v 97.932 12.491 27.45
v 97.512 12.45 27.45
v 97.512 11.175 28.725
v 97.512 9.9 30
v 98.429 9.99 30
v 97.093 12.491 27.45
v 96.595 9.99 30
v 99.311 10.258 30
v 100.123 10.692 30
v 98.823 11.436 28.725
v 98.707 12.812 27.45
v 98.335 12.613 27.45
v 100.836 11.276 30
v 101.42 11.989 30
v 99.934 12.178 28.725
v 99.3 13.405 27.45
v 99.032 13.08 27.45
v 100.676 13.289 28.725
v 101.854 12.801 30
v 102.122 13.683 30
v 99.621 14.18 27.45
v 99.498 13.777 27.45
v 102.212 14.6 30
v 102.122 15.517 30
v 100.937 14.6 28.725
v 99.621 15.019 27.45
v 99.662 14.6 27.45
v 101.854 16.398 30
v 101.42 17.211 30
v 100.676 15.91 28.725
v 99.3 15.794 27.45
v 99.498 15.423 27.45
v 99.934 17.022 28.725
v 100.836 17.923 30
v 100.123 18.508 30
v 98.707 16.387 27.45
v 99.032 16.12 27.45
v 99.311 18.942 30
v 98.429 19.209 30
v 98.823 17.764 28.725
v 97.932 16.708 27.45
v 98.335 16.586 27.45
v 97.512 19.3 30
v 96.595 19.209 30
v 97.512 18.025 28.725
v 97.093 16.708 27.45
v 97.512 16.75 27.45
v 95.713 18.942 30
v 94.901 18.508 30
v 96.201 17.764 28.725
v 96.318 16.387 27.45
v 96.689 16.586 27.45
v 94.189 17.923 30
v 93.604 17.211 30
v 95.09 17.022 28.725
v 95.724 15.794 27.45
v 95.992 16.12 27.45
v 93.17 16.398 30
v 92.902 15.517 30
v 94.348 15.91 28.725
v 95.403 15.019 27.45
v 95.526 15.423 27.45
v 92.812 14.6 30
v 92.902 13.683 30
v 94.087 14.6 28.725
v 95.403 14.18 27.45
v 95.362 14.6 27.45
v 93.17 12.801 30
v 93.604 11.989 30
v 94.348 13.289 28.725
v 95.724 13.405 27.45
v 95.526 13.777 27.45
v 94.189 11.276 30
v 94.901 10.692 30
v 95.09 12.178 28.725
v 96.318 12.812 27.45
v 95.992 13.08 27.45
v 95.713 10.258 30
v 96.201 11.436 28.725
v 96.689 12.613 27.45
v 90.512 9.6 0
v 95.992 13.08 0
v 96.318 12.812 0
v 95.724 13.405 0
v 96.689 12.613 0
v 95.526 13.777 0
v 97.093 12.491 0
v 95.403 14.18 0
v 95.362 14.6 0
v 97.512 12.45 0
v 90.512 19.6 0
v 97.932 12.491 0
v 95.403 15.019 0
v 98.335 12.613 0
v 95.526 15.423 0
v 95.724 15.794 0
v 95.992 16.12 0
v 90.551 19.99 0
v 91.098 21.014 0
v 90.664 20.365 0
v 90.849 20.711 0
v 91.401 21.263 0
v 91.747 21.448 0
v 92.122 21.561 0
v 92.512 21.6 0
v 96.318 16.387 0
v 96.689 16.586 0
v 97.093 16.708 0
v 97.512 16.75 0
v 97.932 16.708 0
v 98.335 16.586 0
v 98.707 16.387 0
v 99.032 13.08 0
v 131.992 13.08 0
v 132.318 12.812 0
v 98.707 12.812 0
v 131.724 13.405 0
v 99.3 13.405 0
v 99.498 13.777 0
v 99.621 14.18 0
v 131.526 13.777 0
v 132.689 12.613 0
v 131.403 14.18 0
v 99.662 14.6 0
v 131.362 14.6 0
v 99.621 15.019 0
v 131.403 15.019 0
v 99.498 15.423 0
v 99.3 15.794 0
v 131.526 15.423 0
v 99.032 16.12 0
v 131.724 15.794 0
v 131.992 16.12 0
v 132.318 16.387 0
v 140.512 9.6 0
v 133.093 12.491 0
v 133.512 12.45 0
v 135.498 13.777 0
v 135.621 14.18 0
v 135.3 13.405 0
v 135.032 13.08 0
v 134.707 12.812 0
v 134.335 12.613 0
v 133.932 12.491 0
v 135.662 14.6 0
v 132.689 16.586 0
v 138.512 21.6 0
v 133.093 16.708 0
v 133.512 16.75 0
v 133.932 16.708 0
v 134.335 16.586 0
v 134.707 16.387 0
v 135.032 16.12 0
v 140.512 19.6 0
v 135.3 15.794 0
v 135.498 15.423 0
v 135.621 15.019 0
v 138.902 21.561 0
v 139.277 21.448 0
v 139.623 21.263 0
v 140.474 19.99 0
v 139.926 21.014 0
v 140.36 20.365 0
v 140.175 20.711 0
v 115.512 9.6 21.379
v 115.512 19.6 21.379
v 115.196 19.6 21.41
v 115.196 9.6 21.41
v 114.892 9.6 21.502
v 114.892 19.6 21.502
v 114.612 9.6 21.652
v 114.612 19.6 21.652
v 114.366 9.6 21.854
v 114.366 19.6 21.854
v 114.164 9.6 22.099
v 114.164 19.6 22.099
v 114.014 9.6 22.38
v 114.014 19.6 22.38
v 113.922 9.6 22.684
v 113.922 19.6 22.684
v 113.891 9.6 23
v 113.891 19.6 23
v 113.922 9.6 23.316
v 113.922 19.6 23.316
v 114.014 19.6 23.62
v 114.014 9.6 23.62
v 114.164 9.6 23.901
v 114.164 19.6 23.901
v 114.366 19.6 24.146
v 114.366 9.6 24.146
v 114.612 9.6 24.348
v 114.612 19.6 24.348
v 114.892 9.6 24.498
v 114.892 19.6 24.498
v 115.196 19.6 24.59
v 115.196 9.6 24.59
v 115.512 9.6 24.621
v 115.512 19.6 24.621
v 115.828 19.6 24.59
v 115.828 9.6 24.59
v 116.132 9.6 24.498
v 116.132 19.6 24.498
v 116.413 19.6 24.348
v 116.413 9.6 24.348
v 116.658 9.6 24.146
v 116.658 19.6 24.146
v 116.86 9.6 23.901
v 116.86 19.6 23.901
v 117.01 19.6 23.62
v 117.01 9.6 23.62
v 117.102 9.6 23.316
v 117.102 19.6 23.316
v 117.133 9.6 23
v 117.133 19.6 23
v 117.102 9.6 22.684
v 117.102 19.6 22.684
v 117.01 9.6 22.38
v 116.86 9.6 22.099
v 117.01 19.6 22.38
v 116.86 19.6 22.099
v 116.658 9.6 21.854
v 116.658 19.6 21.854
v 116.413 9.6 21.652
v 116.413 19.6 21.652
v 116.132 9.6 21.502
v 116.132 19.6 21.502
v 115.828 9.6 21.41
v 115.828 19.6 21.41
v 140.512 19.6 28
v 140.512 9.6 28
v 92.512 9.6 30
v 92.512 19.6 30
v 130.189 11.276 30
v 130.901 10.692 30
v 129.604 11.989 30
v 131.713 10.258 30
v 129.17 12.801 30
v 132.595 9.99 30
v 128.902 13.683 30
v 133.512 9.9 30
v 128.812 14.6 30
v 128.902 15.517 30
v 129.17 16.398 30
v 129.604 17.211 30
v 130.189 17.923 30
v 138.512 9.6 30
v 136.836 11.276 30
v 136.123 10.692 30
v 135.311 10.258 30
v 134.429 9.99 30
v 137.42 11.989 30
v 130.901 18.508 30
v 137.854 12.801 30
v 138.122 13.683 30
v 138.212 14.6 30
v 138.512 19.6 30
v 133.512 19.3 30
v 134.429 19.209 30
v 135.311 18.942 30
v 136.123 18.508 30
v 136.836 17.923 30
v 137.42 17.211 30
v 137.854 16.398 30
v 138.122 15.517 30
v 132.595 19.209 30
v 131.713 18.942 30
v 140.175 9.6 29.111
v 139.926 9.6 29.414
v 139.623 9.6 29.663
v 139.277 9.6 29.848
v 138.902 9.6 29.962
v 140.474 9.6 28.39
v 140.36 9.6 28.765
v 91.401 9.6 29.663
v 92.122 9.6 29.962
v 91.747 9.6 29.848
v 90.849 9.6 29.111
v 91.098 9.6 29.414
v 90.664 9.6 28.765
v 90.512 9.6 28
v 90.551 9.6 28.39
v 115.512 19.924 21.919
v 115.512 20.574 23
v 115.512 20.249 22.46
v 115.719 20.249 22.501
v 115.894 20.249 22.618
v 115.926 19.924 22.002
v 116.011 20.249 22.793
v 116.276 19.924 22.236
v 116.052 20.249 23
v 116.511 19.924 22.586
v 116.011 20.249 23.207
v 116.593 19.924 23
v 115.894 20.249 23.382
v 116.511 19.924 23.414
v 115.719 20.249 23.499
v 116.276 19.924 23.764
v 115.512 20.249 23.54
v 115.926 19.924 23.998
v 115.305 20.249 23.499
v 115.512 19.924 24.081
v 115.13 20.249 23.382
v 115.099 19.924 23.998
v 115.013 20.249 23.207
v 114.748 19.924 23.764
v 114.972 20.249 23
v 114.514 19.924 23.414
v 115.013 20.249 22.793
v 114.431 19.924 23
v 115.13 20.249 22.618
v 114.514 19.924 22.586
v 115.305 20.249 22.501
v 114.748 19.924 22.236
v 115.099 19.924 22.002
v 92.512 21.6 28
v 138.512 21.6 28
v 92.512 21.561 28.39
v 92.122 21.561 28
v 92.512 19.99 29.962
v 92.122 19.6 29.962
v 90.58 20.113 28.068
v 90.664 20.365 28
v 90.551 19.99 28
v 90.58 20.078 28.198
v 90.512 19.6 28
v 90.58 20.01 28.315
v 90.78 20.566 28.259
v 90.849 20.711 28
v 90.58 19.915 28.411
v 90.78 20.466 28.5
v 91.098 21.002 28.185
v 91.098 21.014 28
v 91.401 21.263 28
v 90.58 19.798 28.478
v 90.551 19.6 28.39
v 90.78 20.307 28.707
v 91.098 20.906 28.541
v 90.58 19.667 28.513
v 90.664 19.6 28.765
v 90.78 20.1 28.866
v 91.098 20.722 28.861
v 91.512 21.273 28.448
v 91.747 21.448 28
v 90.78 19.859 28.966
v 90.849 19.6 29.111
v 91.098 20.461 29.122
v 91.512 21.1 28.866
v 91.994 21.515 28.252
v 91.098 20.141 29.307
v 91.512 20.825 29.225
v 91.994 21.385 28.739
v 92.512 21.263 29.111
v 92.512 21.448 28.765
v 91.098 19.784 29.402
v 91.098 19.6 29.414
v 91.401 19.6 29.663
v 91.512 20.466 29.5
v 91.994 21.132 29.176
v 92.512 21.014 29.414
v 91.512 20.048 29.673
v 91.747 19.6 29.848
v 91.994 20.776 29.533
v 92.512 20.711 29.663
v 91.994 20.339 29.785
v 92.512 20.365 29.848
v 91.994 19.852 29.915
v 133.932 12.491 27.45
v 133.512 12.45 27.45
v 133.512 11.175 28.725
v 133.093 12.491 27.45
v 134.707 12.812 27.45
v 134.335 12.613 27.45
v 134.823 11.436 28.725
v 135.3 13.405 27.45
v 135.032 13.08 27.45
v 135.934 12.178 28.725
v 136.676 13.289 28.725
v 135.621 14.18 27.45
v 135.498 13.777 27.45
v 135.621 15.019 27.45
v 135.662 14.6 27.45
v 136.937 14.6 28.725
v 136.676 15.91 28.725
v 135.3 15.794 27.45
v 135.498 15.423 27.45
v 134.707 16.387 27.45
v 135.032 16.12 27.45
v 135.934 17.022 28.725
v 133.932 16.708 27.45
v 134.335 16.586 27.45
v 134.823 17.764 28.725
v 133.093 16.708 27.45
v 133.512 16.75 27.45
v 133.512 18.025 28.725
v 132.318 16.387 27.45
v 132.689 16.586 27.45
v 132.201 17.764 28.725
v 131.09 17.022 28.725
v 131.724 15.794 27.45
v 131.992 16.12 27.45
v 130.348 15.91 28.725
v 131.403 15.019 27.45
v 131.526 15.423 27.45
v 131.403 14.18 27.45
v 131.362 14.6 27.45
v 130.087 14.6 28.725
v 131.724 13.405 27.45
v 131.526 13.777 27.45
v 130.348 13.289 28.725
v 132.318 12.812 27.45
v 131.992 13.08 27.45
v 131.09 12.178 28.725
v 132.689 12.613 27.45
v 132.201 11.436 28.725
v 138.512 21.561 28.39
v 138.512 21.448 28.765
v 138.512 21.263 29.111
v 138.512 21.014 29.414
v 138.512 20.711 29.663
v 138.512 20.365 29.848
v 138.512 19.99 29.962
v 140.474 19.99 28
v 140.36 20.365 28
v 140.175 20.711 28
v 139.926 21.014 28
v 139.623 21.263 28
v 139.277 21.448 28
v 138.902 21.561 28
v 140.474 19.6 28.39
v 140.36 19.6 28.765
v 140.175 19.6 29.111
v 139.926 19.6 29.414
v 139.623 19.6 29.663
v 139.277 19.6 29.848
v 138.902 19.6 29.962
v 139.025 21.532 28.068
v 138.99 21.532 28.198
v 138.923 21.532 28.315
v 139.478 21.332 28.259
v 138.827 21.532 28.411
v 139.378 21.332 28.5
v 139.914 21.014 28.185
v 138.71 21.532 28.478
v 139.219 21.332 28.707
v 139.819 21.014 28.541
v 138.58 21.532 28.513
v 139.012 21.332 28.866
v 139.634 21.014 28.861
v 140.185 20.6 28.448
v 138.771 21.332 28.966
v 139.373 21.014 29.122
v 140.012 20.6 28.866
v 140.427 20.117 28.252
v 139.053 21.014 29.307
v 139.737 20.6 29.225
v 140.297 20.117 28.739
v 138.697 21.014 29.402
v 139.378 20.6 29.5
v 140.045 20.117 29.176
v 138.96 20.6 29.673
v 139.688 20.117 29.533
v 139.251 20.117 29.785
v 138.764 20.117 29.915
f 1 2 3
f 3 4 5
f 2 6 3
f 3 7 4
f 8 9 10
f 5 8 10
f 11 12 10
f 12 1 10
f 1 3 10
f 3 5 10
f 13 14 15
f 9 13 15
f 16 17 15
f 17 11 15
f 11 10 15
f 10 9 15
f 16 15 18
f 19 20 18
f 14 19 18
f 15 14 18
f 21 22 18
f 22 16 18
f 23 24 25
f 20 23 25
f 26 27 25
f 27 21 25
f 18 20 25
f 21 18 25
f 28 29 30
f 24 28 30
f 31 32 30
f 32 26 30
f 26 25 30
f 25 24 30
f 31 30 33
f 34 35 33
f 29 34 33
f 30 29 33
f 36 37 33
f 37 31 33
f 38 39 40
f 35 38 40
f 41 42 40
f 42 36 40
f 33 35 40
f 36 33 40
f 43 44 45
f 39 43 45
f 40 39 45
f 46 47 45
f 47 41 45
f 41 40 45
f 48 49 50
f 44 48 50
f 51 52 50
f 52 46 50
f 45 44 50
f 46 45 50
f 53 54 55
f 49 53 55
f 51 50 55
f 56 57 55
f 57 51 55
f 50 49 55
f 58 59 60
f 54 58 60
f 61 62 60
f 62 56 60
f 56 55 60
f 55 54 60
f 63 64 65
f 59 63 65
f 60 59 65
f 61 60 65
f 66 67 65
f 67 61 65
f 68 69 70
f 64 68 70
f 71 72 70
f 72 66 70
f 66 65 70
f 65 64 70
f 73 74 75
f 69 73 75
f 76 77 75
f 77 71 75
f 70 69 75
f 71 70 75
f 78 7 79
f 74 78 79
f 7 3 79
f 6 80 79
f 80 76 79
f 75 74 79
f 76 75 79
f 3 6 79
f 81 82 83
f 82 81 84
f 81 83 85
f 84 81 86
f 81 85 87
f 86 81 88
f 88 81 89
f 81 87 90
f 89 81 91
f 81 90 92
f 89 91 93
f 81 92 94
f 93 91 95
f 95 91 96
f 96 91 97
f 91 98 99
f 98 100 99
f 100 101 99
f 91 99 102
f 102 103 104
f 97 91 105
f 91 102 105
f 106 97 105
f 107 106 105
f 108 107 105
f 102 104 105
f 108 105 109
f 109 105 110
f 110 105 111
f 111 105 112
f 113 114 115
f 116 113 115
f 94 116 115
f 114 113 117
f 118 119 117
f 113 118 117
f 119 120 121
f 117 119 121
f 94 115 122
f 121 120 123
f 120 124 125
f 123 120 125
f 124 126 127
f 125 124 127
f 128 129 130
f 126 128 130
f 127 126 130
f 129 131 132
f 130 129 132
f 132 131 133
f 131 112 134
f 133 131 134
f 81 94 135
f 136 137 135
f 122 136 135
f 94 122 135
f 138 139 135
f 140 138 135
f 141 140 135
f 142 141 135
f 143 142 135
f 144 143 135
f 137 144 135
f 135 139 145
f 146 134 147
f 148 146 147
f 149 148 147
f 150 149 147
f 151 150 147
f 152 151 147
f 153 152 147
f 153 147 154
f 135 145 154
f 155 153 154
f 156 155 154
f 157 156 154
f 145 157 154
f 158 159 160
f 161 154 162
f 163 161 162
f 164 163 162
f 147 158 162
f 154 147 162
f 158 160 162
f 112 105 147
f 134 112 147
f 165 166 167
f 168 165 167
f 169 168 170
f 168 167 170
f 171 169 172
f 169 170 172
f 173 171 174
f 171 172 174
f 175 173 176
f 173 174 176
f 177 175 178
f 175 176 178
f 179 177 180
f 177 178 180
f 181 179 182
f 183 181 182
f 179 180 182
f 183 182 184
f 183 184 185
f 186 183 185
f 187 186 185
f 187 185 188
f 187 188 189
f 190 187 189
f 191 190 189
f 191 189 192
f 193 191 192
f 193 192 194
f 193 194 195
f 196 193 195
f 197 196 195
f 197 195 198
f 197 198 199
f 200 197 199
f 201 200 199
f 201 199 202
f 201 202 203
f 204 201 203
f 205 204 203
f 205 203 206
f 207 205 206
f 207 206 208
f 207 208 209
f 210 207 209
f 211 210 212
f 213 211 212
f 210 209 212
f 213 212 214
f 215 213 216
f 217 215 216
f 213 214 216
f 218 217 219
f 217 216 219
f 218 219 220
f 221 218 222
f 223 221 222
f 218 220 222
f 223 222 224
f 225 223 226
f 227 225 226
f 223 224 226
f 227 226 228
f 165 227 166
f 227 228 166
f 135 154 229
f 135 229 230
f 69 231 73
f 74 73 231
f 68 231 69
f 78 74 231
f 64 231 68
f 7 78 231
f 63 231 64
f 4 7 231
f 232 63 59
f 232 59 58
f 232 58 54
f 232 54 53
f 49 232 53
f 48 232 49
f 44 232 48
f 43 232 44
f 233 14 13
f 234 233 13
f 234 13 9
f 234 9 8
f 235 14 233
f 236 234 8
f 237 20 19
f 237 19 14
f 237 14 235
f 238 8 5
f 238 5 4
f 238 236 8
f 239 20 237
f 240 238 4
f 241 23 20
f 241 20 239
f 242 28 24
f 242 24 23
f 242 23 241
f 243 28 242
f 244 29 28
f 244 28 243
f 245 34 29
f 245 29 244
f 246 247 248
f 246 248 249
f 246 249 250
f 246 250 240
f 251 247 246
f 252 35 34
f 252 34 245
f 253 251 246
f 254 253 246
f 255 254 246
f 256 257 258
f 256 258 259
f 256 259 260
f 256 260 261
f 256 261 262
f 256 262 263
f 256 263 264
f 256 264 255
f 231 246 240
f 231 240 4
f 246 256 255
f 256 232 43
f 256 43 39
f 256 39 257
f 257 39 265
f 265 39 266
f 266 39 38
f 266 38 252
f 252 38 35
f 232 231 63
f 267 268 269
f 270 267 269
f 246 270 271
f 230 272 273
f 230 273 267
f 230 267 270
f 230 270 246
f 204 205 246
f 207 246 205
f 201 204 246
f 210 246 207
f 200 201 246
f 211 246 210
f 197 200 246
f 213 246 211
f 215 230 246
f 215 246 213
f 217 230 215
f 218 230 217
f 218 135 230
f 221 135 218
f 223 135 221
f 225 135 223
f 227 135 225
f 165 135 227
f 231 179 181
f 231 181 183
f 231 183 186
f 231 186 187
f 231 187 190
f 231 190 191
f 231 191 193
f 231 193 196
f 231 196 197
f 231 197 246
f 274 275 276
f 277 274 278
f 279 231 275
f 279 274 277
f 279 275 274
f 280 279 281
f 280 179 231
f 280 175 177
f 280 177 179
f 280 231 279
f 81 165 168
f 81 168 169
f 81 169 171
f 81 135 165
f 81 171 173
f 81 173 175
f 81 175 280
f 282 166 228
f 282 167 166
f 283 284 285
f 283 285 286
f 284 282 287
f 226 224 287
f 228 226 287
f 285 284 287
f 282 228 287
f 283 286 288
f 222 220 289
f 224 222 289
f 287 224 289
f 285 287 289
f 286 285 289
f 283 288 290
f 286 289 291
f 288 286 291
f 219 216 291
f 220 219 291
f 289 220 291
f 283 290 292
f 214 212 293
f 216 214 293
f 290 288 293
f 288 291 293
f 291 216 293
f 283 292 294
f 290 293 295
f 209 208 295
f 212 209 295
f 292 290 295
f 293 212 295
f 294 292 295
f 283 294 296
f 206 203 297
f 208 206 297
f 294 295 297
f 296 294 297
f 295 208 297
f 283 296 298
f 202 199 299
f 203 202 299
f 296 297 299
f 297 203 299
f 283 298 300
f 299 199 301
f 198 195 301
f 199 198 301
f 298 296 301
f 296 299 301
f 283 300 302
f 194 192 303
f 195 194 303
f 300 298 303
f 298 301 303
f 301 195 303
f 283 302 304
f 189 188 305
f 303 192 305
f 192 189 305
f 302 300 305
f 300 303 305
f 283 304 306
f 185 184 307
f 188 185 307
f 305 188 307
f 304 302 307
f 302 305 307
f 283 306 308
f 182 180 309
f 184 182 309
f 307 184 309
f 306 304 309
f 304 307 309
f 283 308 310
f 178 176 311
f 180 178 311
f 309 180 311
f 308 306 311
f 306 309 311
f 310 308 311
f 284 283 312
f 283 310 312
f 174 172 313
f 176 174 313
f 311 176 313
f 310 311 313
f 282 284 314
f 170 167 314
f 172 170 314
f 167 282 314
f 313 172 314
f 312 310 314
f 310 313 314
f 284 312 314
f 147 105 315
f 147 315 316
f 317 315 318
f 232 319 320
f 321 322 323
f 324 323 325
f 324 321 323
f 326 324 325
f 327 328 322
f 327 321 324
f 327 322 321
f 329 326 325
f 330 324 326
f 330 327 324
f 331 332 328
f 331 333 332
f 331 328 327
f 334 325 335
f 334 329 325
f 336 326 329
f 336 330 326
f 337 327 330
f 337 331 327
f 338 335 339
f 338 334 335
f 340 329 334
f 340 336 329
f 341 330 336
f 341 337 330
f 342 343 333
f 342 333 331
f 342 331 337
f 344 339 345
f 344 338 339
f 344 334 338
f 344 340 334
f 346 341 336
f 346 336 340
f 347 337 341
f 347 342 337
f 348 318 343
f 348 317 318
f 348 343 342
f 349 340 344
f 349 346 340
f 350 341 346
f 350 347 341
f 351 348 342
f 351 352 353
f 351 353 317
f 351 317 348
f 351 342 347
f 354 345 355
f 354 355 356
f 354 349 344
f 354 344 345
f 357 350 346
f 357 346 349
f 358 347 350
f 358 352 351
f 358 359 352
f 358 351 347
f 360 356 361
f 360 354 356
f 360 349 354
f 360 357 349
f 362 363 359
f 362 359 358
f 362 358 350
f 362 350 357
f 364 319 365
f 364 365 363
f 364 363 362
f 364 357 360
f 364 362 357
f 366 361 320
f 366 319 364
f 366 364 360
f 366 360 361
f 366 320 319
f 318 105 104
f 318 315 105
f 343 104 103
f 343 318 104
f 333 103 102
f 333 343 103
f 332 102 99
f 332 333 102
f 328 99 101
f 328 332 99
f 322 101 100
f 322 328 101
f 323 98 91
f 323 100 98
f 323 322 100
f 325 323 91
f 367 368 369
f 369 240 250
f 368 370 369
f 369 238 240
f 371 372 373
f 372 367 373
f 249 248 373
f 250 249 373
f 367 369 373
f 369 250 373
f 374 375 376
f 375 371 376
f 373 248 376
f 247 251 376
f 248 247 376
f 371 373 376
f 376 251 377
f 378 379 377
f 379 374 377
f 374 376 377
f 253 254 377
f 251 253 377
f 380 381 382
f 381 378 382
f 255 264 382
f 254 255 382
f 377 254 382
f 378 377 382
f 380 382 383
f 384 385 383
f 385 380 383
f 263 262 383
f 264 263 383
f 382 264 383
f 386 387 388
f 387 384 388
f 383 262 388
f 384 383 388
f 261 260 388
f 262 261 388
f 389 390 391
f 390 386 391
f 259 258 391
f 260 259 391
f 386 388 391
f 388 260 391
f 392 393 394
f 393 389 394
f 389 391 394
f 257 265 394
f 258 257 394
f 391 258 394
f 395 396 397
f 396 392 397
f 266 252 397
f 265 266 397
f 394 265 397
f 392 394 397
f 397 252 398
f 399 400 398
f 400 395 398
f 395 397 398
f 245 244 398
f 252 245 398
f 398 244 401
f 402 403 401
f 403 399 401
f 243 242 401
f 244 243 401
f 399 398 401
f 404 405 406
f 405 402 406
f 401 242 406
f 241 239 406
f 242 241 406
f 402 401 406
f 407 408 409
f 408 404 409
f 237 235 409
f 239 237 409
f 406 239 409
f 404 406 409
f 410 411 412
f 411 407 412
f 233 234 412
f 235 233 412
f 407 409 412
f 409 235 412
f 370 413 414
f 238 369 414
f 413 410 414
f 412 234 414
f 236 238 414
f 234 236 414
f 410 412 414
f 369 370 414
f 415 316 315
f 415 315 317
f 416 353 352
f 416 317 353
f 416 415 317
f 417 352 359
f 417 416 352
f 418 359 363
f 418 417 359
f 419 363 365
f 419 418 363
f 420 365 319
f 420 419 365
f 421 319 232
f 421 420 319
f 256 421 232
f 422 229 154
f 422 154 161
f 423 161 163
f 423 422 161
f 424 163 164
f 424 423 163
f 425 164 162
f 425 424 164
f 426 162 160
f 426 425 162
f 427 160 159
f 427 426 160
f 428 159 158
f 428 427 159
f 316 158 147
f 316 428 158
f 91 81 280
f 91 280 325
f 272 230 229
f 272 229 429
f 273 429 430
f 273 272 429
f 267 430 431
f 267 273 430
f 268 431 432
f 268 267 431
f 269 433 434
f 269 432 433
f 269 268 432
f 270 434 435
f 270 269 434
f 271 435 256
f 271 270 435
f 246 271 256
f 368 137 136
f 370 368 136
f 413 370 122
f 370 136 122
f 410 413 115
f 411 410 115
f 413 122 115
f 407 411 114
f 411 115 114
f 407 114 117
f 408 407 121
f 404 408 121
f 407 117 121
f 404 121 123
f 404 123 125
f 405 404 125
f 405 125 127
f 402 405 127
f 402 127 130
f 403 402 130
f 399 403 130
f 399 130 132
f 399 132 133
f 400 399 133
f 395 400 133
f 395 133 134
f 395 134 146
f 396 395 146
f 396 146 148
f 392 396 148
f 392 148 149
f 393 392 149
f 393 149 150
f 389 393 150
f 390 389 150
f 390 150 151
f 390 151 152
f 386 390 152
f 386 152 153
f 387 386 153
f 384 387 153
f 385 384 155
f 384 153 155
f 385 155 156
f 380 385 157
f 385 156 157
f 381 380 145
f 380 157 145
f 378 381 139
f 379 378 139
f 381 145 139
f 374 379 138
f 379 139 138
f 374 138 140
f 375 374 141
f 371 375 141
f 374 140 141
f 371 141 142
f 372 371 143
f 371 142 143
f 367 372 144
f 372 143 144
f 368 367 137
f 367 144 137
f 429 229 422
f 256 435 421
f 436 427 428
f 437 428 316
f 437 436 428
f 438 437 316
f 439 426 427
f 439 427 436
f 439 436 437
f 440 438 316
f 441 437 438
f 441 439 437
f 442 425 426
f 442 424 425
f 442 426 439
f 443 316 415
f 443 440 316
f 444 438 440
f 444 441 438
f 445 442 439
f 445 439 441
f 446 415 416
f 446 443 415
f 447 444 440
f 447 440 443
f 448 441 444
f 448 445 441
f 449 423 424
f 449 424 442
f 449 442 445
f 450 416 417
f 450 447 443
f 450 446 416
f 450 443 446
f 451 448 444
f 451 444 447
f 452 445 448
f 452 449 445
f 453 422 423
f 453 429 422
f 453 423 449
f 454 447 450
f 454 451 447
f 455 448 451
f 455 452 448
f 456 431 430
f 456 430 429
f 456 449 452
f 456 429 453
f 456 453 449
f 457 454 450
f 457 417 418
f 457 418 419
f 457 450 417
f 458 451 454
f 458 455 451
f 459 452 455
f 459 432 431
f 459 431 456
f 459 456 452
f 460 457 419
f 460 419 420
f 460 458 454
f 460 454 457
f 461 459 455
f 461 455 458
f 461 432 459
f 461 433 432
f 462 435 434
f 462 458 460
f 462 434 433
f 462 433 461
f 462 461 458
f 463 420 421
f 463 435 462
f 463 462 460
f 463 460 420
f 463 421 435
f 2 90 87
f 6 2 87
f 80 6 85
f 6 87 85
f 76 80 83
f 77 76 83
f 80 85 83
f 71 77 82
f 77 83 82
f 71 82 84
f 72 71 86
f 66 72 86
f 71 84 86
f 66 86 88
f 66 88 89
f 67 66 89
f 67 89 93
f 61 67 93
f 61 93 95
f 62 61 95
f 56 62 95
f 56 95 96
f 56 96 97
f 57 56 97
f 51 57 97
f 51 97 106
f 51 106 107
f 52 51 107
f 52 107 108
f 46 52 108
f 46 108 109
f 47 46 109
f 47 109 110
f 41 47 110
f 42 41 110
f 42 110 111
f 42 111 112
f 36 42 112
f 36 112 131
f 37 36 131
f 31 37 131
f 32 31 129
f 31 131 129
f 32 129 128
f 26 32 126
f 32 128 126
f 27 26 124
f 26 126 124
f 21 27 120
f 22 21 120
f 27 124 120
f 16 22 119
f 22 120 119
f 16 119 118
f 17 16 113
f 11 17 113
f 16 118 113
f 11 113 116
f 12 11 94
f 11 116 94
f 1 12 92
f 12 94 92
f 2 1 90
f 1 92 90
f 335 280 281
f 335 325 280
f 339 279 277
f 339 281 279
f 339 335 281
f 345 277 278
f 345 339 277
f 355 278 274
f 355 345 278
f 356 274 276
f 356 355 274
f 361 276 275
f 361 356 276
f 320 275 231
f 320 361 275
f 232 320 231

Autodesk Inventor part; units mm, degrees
ref_plane "YZ Plane" through (0, 0, 0) normal (1, 0, 0) x (0, 1, 0)
ref_plane "XZ Plane" through (0, 0, 0) normal (0, 1, 0) x (-1, 0, 0)
ref_plane "XY Plane" through (0, 0, 0) normal (0, 0, 1) x (1, 0, 0)
sketch "Skizze1" plane through (0, 0, 0) normal (0, 0, 1) x (1, 0, 0)
  line L0 (140.5121, 9.5998) -> (90.5121, 9.5998)
  line L1 (90.5121, 9.5998) -> (90.5121, 21.5998)
  line L2 (90.5121, 21.5998) -> (140.5121, 21.5998)
  line L3 (140.5121, 21.5998) -> (140.5121, 9.5998)
  point P0 (0, 0)
  dimension "d0" = 50
  dimension "d1" = 12
extrude "Extrusion1" add sketch "Skizze1" along normal blind 30
sketch "Skizze2" plane through (0, 0, 30) normal (0, 0, 1) x (1, 0, 0)
  line L0 (140.5121, 9.5998) -> (140.5121, 21.5998) projected
  line L1 (140.5121, 14.5998) -> (133.5121, 14.5998)
  line L2 (133.5121, 14.5998) -> (97.5121, 14.5998)
  line L3 (97.5121, 14.5998) -> (90.5121, 14.5998)
  line L4 (90.5121, 21.5998) -> (90.5121, 9.5998) projected
  line L5 (140.5121, 21.5998) -> (90.5121, 21.5998) projected
  point P0 (0, 0)
  dimension "d4" = 7
  dimension "d12" = 7
hole "Bohrung1" at (133.5121, 14.5998, 30) at (97.5121, 14.5998, 30) direction (0, 0, -1) diameter 4.3 end through all countersink diameter 9.4 countersink angle 90 clearance for "Flachkopfmaschinenschraube" size "M4" standard "ANSI Metrisches M Profil"
sketch "Skizze3" plane through (90.5121, 9.5998, 0) normal (0, 1, 0) x (1, 0, 0)
  line L0 (25, -23) -> (25, -30)
  line L1 (50, -30) -> (0, -30) projected
  point P0 (-90.5121, 0)
  dimension "d14" = 7
hole "Bohrung4" at (115.5121, 9.5998, 23) direction (0, 1, 0) diameter 3.242 depth 10 tip angle 118 thread size "M4x0.7" class "6H" standard "ANSI Metric M Profile"
fillet "Rundung2" radius 2 5 edges at (140.5121, 15.5998, 30) (115.5121, 21.5998, 30) (90.5121, 15.5998, 30) (140.5121, 21.5998, 15) (90.5121, 21.5998, 15)
properties part number "HebelhalterBlock" material "Aluminium 6061(1)"
